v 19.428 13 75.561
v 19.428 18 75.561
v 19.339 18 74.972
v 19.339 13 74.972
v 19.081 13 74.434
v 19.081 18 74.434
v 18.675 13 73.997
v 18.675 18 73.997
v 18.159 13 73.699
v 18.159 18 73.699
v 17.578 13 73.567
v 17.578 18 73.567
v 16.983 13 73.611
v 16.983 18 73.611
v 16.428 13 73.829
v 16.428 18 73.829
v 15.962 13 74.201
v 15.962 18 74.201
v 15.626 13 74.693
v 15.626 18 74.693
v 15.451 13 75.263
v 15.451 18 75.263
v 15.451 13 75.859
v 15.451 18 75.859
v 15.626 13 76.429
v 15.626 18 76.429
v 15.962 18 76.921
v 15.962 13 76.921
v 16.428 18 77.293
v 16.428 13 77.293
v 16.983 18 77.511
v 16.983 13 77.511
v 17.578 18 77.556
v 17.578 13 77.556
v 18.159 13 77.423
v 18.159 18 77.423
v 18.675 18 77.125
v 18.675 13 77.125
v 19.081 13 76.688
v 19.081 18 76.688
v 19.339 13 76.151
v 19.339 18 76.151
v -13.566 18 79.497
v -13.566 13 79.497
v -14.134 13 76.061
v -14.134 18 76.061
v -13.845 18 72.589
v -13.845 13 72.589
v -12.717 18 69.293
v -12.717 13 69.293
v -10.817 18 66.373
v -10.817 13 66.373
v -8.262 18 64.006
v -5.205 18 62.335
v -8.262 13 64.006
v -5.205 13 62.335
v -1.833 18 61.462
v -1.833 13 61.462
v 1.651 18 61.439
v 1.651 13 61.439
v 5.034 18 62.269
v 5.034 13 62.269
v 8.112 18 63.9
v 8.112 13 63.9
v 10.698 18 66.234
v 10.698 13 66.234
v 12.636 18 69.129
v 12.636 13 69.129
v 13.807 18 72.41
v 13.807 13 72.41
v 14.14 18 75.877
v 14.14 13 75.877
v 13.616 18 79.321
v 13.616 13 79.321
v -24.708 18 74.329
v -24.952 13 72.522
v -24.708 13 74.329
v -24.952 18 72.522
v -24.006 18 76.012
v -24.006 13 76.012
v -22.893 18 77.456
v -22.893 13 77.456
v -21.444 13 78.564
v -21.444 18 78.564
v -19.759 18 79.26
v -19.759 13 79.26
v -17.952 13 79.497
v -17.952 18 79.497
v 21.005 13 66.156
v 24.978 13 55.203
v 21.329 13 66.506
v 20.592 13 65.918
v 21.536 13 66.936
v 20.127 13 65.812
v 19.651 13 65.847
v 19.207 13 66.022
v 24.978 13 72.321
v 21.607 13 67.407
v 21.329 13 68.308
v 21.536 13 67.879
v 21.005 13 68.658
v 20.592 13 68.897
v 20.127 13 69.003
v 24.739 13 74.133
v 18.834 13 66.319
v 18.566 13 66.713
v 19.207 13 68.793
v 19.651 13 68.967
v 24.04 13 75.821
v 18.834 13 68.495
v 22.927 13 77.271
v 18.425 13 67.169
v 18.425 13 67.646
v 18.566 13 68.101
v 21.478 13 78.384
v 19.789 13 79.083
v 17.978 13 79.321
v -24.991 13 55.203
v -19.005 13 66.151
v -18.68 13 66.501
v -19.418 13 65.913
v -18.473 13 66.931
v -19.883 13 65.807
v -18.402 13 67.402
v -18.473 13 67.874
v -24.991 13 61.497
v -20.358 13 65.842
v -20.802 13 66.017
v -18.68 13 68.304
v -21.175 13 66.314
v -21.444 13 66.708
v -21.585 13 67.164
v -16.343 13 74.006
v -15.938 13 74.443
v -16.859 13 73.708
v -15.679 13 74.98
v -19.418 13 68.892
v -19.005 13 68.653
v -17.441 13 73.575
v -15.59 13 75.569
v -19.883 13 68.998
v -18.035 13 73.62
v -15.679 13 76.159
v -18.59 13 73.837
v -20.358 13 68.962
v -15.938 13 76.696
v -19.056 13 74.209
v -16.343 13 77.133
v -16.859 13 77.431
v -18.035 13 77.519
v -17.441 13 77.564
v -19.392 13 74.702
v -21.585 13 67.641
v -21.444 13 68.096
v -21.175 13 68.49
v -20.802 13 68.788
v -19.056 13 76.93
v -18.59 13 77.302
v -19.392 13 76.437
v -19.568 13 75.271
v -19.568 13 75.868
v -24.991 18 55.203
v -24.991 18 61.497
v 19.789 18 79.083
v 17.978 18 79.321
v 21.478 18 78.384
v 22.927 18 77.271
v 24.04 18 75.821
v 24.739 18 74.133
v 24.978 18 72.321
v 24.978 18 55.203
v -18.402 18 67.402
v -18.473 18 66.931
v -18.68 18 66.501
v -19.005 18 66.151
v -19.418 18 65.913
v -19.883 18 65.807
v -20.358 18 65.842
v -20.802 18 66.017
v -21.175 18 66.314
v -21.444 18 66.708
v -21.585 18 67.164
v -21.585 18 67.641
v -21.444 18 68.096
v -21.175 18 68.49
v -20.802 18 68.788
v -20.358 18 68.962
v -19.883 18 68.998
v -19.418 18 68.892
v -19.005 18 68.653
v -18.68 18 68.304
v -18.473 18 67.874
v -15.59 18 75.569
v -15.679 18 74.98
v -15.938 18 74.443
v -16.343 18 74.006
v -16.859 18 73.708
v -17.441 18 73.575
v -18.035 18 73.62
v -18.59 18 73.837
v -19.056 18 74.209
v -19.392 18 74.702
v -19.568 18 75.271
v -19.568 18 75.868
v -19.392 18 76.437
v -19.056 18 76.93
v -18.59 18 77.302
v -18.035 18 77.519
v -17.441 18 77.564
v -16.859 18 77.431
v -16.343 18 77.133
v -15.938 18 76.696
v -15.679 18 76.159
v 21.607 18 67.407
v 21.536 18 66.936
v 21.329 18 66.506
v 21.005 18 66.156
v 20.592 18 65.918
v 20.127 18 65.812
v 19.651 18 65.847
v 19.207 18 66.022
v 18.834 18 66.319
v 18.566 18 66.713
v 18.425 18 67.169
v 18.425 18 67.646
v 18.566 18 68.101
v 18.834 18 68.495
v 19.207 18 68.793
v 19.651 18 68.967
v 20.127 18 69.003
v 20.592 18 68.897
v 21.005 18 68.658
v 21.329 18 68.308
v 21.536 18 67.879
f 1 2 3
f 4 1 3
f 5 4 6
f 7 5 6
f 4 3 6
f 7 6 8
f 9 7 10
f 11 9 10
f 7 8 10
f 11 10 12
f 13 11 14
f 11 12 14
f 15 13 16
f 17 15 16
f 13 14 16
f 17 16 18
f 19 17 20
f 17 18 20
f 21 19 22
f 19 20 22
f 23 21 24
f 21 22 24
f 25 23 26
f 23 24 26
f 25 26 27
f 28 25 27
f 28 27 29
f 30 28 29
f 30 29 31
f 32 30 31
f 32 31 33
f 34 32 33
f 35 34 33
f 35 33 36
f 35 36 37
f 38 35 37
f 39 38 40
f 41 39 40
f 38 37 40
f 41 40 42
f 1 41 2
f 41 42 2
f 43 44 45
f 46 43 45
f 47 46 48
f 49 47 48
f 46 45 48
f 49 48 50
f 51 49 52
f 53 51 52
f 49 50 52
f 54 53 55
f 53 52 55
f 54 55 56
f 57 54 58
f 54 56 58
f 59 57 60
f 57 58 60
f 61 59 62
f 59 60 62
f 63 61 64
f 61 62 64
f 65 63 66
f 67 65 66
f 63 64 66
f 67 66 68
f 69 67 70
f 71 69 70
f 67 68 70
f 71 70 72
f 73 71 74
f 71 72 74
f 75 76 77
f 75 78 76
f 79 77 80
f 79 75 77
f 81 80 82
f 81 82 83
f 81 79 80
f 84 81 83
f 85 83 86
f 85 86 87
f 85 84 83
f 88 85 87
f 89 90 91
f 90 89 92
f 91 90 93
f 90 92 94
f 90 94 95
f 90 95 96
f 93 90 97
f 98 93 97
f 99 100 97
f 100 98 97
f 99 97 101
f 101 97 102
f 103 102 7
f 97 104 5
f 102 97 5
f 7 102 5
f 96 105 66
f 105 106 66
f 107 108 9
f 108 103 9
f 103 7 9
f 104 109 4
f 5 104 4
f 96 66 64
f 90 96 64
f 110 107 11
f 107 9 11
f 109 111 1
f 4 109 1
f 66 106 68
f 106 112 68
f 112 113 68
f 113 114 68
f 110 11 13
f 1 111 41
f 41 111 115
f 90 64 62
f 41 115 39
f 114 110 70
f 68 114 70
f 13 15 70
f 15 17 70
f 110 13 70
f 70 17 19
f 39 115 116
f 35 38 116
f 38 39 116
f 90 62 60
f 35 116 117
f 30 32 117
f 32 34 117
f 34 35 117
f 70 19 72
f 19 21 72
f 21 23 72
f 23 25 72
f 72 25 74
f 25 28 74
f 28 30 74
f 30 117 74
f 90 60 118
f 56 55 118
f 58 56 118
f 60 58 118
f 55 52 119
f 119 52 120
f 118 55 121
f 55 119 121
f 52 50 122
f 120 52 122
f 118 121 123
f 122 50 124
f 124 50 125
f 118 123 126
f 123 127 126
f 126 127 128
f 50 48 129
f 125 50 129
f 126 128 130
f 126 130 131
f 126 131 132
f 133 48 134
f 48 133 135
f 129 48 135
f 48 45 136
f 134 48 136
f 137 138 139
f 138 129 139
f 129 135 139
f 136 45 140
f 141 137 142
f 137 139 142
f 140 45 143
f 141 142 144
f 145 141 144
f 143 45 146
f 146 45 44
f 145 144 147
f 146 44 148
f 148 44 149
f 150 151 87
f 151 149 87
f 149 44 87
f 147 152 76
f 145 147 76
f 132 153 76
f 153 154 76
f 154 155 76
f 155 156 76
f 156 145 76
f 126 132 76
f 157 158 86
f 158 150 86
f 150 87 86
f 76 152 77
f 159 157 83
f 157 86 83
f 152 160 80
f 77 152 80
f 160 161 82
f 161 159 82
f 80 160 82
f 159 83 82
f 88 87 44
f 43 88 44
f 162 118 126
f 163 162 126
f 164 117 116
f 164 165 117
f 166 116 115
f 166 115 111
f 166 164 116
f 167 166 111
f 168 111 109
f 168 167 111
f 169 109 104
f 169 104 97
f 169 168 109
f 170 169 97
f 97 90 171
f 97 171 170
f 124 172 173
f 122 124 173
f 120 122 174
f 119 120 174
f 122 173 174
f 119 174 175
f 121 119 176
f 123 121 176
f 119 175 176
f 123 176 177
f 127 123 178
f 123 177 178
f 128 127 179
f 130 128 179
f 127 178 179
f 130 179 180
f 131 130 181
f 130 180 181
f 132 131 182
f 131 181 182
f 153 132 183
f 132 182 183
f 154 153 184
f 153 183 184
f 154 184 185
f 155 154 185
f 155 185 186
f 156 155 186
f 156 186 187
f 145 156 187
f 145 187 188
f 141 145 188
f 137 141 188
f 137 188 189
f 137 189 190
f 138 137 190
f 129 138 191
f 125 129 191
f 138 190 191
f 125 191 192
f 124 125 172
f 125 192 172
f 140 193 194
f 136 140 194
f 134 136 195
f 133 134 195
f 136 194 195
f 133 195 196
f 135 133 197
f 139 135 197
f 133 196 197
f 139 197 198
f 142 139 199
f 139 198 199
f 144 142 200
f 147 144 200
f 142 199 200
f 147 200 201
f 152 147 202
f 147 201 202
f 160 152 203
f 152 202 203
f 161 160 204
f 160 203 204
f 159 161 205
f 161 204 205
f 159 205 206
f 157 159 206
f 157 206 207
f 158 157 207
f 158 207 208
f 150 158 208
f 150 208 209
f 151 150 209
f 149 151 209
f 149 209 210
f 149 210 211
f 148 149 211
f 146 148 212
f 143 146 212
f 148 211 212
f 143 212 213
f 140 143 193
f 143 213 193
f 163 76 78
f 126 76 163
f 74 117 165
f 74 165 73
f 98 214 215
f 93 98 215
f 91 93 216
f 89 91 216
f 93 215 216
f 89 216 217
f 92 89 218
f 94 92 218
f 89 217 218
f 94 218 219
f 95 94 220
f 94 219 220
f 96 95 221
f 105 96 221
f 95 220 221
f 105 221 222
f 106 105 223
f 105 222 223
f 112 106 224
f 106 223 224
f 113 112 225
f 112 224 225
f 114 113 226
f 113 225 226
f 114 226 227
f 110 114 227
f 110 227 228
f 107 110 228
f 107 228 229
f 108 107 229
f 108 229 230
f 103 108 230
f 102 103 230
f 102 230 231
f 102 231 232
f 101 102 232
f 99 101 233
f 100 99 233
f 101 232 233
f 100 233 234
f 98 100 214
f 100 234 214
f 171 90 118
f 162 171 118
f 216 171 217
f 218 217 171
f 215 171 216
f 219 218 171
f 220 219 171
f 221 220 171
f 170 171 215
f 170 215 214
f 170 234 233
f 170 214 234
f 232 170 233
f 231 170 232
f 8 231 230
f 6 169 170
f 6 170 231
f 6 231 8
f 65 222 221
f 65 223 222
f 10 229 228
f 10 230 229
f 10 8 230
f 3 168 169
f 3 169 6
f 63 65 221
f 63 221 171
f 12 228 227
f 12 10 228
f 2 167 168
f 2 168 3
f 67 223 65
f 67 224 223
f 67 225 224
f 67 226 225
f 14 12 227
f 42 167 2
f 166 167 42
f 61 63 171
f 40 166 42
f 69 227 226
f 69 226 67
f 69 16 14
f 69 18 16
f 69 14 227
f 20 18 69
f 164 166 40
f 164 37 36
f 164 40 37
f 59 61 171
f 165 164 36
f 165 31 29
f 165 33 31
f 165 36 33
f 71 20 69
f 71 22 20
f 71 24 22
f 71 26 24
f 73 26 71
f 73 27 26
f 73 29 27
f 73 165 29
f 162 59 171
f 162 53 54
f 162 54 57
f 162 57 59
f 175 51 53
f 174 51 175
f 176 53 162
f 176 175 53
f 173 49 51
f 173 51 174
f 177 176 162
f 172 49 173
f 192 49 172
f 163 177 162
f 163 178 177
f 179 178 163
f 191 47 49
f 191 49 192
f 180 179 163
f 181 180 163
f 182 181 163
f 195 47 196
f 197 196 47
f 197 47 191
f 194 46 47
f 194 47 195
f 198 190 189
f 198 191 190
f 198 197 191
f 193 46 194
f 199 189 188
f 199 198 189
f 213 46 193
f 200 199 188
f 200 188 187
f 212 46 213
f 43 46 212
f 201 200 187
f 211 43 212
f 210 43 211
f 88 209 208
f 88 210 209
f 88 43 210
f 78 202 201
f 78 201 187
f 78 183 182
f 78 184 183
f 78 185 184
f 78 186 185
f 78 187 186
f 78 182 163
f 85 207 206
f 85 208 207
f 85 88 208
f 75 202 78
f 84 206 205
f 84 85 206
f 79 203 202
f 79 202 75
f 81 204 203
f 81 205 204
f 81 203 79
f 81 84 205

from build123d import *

# Parameters (mm, degrees)
PAD018_DEPTH    = 5
FILLET_R        = 7
SKETCH045_R     = 2
SKETCH045_R_2   = 1.6
POCKET014_DEPTH = 5


with BuildPart() as part:
    # Sketch044 → Pad018 (new body)
    with BuildSketch(Plane.XZ):
        with BuildLine():
            ThreePointArc((-13.565707, 79.497418), (-0.091594, 61.343037), (13.616485, 79.321409))
            Line((24.977643, 79.321409), (13.616485, 79.321409))
            Line((24.977643, 61.321409), (24.977643, 79.321409))
            Line((24.977643, 61.321409), (24.977643, 55.203457))
            Line((24.977643, 55.203457), (-24.990618, 55.203457))
            Line((-24.990618, 55.203457), (-24.990618, 61.497418))
            Line((-24.926865, 79.497418), (-24.990618, 61.497418))
            Line((-24.926865, 79.497418), (-13.565707, 79.497418))
        make_face()
    extrude(amount=-PAD018_DEPTH)

    # Fillet
    fillet_edges = [part.edges().sort_by_distance(p)[0] for p in [
        (24.977643, 2.5, 79.321409),
        (-24.926865, 2.5, 79.497418),
    ]]
    fillet(fillet_edges, radius=FILLET_R)

    # Sketch045 (on Face5 of Fillet) → Pocket014 (cut)
    with BuildSketch(Plane(origin=(0, 5, 0), x_dir=(1, 0, 0), z_dir=(0, 1, 0))):
        with Locations((-17.590132, -75.56945)):
            Circle(SKETCH045_R)
        with Locations((17.428322, -75.561134)):
            Circle(SKETCH045_R)
        with Locations((-20.002373, -67.402222)):
            Circle(SKETCH045_R_2)
        with Locations((20.00708, -67.407166)):
            Circle(SKETCH045_R_2)
    extrude(amount=-POCKET014_DEPTH, mode=Mode.SUBTRACT)


with BuildPart() as part_1:
    # Body020 placement: moved
    add(part.part.moved(Location((0, 13, 0))))


solid = part_1.part
